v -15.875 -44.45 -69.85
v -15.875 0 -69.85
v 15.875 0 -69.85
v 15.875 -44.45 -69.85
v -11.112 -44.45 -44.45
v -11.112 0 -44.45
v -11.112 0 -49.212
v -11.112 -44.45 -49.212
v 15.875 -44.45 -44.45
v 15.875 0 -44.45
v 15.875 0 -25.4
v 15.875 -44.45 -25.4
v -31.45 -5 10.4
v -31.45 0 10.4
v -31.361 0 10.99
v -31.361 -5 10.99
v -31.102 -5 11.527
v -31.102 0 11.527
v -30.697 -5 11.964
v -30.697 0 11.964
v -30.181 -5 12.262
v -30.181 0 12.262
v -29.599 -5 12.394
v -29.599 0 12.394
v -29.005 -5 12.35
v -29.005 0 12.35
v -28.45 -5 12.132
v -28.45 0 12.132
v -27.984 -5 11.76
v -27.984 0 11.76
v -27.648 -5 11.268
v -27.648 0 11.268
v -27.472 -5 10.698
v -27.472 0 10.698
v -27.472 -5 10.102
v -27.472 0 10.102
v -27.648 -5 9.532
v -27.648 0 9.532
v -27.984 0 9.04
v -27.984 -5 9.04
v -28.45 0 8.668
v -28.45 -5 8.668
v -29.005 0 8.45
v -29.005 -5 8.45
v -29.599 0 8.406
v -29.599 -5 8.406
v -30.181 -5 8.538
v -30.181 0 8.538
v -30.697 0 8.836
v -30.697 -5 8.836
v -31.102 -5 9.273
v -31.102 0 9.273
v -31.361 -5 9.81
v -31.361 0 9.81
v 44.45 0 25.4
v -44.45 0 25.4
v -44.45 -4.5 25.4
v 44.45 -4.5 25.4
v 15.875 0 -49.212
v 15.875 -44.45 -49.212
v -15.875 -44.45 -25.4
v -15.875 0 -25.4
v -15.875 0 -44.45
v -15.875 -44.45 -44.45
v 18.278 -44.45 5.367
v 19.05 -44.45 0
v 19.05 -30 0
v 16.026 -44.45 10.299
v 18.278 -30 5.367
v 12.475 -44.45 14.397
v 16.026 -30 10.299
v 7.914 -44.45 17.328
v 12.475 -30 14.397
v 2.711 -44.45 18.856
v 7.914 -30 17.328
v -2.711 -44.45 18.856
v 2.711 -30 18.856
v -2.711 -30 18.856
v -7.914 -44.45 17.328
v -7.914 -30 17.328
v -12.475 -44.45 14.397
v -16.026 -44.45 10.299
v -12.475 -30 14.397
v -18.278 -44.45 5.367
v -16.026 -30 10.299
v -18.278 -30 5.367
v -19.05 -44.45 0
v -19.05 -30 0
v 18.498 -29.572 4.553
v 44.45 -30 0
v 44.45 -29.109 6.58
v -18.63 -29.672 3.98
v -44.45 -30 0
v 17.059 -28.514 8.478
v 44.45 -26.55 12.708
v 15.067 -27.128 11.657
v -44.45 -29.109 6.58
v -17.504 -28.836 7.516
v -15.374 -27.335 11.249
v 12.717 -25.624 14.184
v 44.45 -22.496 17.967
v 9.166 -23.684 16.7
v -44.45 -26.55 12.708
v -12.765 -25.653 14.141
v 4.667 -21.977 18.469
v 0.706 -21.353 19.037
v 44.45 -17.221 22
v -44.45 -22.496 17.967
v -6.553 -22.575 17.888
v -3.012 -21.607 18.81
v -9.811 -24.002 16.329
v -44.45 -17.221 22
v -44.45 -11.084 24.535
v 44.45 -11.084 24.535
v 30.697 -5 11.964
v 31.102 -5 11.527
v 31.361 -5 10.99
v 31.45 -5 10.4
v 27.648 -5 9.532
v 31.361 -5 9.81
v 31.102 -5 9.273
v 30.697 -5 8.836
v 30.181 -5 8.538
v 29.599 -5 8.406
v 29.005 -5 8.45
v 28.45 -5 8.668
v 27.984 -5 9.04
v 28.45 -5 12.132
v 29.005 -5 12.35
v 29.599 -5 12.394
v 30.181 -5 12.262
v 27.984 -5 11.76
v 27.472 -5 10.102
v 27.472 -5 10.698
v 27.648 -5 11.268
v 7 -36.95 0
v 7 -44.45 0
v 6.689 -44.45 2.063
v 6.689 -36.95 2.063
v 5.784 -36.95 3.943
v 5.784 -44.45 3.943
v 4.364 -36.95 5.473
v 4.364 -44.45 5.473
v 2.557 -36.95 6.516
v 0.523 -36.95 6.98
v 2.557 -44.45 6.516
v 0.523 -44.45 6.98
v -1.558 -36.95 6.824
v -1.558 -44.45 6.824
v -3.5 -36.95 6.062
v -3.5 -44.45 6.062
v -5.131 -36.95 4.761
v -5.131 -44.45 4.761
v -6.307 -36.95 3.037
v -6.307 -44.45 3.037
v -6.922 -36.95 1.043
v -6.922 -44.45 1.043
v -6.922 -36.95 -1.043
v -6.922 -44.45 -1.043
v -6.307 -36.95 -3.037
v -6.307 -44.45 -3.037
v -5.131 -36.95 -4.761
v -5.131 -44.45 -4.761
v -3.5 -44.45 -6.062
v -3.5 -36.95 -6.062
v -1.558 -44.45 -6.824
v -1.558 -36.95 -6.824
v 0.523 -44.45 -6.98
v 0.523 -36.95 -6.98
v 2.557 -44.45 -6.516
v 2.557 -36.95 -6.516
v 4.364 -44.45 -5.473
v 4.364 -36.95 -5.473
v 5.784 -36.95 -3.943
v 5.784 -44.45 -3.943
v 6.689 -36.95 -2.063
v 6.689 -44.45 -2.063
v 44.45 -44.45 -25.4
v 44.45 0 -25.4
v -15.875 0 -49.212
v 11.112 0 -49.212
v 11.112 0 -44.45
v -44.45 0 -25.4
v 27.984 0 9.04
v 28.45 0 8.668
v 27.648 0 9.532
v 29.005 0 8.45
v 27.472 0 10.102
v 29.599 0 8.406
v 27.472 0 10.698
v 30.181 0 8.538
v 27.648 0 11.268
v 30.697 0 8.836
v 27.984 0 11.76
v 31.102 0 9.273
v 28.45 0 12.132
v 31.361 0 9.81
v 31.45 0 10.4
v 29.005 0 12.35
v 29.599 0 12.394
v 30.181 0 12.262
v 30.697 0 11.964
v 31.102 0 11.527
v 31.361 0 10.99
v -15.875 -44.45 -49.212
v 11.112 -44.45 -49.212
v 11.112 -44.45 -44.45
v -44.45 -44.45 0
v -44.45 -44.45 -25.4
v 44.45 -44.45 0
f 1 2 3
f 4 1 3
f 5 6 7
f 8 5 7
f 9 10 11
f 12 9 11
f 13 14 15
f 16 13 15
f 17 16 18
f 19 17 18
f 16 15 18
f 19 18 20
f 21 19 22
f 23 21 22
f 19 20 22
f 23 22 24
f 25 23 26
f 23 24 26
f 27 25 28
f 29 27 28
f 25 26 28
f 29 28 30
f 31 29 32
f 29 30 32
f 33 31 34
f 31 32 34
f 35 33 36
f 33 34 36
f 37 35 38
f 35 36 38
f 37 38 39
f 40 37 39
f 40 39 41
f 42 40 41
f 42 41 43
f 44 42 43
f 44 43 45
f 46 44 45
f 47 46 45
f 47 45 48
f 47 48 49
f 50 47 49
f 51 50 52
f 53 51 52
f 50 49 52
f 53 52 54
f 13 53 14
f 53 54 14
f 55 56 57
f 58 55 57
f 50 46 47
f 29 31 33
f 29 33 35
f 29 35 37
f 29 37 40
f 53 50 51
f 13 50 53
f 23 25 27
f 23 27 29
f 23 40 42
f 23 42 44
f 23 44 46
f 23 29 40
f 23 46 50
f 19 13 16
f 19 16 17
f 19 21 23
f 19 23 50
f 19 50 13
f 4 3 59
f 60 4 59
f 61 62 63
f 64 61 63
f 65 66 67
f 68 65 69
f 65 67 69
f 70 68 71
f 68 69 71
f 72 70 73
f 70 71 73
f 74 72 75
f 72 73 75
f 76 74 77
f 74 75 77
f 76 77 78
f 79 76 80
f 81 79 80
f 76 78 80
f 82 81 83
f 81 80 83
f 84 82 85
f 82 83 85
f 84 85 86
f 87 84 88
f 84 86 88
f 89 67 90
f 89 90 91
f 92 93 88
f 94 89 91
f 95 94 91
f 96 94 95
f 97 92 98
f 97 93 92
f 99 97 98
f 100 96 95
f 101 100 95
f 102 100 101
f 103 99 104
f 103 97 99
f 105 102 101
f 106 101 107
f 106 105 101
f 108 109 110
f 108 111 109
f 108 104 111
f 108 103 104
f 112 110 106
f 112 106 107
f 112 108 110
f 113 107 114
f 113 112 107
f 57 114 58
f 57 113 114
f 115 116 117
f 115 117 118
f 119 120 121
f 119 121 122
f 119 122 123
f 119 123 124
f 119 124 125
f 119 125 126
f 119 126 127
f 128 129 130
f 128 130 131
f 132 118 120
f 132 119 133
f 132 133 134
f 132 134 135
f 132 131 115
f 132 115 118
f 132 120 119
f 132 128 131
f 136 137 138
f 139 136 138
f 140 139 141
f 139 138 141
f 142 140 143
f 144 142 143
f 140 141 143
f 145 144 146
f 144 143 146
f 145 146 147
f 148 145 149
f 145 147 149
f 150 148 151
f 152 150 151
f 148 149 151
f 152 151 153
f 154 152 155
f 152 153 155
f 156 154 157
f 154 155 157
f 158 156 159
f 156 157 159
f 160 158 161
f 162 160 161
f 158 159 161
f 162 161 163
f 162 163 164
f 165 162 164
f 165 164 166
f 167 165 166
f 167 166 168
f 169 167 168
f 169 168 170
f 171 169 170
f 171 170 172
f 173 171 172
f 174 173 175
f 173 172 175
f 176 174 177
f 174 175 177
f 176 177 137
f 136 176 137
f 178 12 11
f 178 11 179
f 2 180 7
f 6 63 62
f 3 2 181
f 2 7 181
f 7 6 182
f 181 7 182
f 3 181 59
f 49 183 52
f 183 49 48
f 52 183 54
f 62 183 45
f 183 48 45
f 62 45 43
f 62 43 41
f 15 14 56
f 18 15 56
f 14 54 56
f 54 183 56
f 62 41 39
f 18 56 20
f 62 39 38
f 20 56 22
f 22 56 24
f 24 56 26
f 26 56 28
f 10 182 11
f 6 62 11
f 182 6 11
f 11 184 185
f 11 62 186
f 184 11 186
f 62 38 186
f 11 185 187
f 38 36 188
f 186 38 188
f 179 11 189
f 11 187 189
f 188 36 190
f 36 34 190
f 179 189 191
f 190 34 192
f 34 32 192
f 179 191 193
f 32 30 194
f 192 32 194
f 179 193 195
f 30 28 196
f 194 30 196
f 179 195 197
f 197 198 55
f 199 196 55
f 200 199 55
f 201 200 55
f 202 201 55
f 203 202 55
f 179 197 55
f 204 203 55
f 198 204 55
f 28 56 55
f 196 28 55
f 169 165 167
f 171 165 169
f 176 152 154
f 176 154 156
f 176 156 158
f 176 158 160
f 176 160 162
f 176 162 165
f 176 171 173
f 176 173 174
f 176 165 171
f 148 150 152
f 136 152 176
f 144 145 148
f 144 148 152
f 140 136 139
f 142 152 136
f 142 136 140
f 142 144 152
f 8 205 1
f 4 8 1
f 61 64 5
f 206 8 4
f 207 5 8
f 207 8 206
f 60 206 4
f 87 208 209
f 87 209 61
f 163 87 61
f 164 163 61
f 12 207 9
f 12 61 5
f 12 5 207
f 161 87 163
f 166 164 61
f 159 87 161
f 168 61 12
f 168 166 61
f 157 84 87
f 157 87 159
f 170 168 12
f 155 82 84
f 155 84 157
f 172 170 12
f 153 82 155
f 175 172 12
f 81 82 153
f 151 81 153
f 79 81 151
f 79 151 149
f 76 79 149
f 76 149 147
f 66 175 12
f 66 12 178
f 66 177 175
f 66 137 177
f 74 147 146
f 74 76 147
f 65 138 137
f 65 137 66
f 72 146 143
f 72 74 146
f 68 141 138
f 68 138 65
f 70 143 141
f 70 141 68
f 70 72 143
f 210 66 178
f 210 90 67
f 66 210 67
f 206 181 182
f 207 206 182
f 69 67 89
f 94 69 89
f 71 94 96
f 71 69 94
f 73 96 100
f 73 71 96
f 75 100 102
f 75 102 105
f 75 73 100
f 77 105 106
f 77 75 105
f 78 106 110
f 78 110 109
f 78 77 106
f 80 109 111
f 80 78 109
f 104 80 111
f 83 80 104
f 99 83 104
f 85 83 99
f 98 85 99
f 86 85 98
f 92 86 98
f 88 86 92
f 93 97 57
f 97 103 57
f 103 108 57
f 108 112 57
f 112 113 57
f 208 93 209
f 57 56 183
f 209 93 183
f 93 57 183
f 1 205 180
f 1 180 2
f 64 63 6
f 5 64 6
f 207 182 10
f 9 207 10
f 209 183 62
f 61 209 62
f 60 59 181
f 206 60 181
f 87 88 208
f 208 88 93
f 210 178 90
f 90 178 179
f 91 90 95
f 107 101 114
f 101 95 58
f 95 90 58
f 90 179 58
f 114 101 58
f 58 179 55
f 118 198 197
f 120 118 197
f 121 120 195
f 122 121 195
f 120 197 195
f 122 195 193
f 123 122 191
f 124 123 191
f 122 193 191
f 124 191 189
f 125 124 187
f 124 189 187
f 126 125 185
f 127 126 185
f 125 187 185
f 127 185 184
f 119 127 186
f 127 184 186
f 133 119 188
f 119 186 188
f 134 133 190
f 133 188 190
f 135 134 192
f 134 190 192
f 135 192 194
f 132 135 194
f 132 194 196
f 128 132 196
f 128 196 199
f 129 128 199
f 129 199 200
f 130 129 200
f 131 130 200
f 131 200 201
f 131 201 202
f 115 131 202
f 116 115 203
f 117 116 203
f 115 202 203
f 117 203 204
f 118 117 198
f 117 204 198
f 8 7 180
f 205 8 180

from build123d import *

# Parameters (mm, degrees)
F1_DEPTH    = 44.45
F2_W        = 30
F2_H        = 25.4
F3_DEPTH    = 88.9
F4_T4_DEPTH = 216.4
F4_S6_R     = 19.05
F4_T7_DEPTH = 111
F5_R        = 9.525
F6_DEPTH    = 12.7
F7_R        = 2
F8_DEPTH    = 5
F9_R        = 9.525
F10_DEPTH   = 24.5
F11_R       = 7
F12_DEPTH   = 7.5


# Not quite as in the source:
# - a fillet or chamfer that OpenCascade refuses, or shapes differently, is made with other operations: its cross-section is extruded or revolved along the edge and cut away or added


with BuildPart() as f1:
    # F0 (on Front) → F1 (new body)
    with BuildSketch(Plane.XZ):
        with BuildLine():
            Line((0, 0), (19.05, 0))
            ThreePointArc((19.05, 0), (0, 19.05), (-19.05, 0))
            Line((-19.05, 0), (0, 0))
        make_face()
        with BuildLine():
            Line((44.45, 0), (19.05, 0))
            ThreePointArc((19.05, 0), (0, -19.05), (-19.05, 0))
            Line((-19.05, 0), (-44.45, 0))
            Line((-44.45, 0), (-44.45, -25.4))
            Line((-44.45, -25.4), (-15.875, -25.4))
            Line((-15.875, -25.4), (-15.875, -44.45))
            Line((-15.875, -44.45), (-11.1125, -44.45))
            Line((-11.1125, -44.45), (-11.1125, -49.2125))
            Line((-11.1125, -49.2125), (-15.875, -49.2125))
            Line((-15.875, -49.2125), (-15.875, -69.85))
            Line((-15.875, -69.85), (15.875, -69.85))
            Line((15.875, -69.85), (15.875, -49.2125))
            Line((15.875, -49.2125), (11.1125, -49.2125))
            Line((11.1125, -49.2125), (11.1125, -44.45))
            Line((11.1125, -44.45), (15.875, -44.45))
            Line((15.875, -44.45), (15.875, -25.4))
            Line((15.875, -25.4), (44.45, -25.4))
            Line((44.45, -25.4), (44.45, 0))
        make_face()
        with BuildLine():
            ThreePointArc((-19.05, 0), (0, -19.05), (19.05, 0))
            Line((19.05, 0), (0, 0))
            Line((0, 0), (-19.05, 0))
        make_face()
    extrude(amount=F1_DEPTH)

    # F2 (on face) → F3 (join)
    with BuildSketch(Plane(origin=(-44.45, 0, 0), x_dir=(0, -1, 0), z_dir=(-1, 0, 0))):
        with Locations((15, 12.7)):
            Rectangle(F2_W, F2_H)
    extrude(amount=-F3_DEPTH)

    # F4: fillet of radius 25.5 on 1 edges, made by hand


with BuildPart() as f4_tool2:
    # F4_s3 → F4_t4 (new body)
    with BuildSketch(Plane.YZ.offset(-108.2)):
        with BuildLine():
            ThreePointArc((-30, -0.1), (-22.5312229203, 17.9312229203), (-4.5, 25.4))
            Line((-4.5, 25.4), (-30, 25.4))
            Line((-30, 25.4), (-30, -0.1))
        make_face()
    extrude(amount=F4_T4_DEPTH)

    split(bisect_by=Plane.XY, keep=Keep.TOP)

    # F4_s6 → F4_t7 (cut, symmetric)
    with BuildSketch(Plane.XZ.offset(17.2)):
        Circle(F4_S6_R)
    extrude(amount=F4_T7_DEPTH, both=True, mode=Mode.SUBTRACT)


with BuildPart() as f1_1:
    add(f1.part)

    # F4_t1: cut F4_tool2
    add(f4_tool2.part, mode=Mode.SUBTRACT)

    # F5 (on face) → F6 (cut)
    with BuildSketch(Plane.XZ.offset(44.45)):
        Circle(F5_R)
    extrude(amount=-F6_DEPTH, mode=Mode.SUBTRACT)

    # F7 (on face) → F8 (cut)
    with BuildSketch(Plane(origin=(0, 0, 0), x_dir=(-1, 0, 0), z_dir=(0, 1, 0))):
        with BuildLine():
            ThreePointArc((-27.45, 10.4), (-29.45, 12.4), (-31.45, 10.4))
            ThreePointArc((-31.45, 10.4), (-29.45, 8.4), (-27.45, 10.4))
        make_face()
        with Locations((29.45, 10.4)):
            Circle(F7_R)
    extrude(amount=-F8_DEPTH, mode=Mode.SUBTRACT)

    # F9 (on face) → F10 (join)
    with BuildSketch(Plane.XZ.offset(44.45)):
        Circle(F9_R)
    extrude(amount=-F10_DEPTH)

    # F11 (on face) → F12 (cut)
    with BuildSketch(Plane.XZ.offset(44.45)):
        Circle(F11_R)
    extrude(amount=-F12_DEPTH, mode=Mode.SUBTRACT)


solid = f1_1.part
